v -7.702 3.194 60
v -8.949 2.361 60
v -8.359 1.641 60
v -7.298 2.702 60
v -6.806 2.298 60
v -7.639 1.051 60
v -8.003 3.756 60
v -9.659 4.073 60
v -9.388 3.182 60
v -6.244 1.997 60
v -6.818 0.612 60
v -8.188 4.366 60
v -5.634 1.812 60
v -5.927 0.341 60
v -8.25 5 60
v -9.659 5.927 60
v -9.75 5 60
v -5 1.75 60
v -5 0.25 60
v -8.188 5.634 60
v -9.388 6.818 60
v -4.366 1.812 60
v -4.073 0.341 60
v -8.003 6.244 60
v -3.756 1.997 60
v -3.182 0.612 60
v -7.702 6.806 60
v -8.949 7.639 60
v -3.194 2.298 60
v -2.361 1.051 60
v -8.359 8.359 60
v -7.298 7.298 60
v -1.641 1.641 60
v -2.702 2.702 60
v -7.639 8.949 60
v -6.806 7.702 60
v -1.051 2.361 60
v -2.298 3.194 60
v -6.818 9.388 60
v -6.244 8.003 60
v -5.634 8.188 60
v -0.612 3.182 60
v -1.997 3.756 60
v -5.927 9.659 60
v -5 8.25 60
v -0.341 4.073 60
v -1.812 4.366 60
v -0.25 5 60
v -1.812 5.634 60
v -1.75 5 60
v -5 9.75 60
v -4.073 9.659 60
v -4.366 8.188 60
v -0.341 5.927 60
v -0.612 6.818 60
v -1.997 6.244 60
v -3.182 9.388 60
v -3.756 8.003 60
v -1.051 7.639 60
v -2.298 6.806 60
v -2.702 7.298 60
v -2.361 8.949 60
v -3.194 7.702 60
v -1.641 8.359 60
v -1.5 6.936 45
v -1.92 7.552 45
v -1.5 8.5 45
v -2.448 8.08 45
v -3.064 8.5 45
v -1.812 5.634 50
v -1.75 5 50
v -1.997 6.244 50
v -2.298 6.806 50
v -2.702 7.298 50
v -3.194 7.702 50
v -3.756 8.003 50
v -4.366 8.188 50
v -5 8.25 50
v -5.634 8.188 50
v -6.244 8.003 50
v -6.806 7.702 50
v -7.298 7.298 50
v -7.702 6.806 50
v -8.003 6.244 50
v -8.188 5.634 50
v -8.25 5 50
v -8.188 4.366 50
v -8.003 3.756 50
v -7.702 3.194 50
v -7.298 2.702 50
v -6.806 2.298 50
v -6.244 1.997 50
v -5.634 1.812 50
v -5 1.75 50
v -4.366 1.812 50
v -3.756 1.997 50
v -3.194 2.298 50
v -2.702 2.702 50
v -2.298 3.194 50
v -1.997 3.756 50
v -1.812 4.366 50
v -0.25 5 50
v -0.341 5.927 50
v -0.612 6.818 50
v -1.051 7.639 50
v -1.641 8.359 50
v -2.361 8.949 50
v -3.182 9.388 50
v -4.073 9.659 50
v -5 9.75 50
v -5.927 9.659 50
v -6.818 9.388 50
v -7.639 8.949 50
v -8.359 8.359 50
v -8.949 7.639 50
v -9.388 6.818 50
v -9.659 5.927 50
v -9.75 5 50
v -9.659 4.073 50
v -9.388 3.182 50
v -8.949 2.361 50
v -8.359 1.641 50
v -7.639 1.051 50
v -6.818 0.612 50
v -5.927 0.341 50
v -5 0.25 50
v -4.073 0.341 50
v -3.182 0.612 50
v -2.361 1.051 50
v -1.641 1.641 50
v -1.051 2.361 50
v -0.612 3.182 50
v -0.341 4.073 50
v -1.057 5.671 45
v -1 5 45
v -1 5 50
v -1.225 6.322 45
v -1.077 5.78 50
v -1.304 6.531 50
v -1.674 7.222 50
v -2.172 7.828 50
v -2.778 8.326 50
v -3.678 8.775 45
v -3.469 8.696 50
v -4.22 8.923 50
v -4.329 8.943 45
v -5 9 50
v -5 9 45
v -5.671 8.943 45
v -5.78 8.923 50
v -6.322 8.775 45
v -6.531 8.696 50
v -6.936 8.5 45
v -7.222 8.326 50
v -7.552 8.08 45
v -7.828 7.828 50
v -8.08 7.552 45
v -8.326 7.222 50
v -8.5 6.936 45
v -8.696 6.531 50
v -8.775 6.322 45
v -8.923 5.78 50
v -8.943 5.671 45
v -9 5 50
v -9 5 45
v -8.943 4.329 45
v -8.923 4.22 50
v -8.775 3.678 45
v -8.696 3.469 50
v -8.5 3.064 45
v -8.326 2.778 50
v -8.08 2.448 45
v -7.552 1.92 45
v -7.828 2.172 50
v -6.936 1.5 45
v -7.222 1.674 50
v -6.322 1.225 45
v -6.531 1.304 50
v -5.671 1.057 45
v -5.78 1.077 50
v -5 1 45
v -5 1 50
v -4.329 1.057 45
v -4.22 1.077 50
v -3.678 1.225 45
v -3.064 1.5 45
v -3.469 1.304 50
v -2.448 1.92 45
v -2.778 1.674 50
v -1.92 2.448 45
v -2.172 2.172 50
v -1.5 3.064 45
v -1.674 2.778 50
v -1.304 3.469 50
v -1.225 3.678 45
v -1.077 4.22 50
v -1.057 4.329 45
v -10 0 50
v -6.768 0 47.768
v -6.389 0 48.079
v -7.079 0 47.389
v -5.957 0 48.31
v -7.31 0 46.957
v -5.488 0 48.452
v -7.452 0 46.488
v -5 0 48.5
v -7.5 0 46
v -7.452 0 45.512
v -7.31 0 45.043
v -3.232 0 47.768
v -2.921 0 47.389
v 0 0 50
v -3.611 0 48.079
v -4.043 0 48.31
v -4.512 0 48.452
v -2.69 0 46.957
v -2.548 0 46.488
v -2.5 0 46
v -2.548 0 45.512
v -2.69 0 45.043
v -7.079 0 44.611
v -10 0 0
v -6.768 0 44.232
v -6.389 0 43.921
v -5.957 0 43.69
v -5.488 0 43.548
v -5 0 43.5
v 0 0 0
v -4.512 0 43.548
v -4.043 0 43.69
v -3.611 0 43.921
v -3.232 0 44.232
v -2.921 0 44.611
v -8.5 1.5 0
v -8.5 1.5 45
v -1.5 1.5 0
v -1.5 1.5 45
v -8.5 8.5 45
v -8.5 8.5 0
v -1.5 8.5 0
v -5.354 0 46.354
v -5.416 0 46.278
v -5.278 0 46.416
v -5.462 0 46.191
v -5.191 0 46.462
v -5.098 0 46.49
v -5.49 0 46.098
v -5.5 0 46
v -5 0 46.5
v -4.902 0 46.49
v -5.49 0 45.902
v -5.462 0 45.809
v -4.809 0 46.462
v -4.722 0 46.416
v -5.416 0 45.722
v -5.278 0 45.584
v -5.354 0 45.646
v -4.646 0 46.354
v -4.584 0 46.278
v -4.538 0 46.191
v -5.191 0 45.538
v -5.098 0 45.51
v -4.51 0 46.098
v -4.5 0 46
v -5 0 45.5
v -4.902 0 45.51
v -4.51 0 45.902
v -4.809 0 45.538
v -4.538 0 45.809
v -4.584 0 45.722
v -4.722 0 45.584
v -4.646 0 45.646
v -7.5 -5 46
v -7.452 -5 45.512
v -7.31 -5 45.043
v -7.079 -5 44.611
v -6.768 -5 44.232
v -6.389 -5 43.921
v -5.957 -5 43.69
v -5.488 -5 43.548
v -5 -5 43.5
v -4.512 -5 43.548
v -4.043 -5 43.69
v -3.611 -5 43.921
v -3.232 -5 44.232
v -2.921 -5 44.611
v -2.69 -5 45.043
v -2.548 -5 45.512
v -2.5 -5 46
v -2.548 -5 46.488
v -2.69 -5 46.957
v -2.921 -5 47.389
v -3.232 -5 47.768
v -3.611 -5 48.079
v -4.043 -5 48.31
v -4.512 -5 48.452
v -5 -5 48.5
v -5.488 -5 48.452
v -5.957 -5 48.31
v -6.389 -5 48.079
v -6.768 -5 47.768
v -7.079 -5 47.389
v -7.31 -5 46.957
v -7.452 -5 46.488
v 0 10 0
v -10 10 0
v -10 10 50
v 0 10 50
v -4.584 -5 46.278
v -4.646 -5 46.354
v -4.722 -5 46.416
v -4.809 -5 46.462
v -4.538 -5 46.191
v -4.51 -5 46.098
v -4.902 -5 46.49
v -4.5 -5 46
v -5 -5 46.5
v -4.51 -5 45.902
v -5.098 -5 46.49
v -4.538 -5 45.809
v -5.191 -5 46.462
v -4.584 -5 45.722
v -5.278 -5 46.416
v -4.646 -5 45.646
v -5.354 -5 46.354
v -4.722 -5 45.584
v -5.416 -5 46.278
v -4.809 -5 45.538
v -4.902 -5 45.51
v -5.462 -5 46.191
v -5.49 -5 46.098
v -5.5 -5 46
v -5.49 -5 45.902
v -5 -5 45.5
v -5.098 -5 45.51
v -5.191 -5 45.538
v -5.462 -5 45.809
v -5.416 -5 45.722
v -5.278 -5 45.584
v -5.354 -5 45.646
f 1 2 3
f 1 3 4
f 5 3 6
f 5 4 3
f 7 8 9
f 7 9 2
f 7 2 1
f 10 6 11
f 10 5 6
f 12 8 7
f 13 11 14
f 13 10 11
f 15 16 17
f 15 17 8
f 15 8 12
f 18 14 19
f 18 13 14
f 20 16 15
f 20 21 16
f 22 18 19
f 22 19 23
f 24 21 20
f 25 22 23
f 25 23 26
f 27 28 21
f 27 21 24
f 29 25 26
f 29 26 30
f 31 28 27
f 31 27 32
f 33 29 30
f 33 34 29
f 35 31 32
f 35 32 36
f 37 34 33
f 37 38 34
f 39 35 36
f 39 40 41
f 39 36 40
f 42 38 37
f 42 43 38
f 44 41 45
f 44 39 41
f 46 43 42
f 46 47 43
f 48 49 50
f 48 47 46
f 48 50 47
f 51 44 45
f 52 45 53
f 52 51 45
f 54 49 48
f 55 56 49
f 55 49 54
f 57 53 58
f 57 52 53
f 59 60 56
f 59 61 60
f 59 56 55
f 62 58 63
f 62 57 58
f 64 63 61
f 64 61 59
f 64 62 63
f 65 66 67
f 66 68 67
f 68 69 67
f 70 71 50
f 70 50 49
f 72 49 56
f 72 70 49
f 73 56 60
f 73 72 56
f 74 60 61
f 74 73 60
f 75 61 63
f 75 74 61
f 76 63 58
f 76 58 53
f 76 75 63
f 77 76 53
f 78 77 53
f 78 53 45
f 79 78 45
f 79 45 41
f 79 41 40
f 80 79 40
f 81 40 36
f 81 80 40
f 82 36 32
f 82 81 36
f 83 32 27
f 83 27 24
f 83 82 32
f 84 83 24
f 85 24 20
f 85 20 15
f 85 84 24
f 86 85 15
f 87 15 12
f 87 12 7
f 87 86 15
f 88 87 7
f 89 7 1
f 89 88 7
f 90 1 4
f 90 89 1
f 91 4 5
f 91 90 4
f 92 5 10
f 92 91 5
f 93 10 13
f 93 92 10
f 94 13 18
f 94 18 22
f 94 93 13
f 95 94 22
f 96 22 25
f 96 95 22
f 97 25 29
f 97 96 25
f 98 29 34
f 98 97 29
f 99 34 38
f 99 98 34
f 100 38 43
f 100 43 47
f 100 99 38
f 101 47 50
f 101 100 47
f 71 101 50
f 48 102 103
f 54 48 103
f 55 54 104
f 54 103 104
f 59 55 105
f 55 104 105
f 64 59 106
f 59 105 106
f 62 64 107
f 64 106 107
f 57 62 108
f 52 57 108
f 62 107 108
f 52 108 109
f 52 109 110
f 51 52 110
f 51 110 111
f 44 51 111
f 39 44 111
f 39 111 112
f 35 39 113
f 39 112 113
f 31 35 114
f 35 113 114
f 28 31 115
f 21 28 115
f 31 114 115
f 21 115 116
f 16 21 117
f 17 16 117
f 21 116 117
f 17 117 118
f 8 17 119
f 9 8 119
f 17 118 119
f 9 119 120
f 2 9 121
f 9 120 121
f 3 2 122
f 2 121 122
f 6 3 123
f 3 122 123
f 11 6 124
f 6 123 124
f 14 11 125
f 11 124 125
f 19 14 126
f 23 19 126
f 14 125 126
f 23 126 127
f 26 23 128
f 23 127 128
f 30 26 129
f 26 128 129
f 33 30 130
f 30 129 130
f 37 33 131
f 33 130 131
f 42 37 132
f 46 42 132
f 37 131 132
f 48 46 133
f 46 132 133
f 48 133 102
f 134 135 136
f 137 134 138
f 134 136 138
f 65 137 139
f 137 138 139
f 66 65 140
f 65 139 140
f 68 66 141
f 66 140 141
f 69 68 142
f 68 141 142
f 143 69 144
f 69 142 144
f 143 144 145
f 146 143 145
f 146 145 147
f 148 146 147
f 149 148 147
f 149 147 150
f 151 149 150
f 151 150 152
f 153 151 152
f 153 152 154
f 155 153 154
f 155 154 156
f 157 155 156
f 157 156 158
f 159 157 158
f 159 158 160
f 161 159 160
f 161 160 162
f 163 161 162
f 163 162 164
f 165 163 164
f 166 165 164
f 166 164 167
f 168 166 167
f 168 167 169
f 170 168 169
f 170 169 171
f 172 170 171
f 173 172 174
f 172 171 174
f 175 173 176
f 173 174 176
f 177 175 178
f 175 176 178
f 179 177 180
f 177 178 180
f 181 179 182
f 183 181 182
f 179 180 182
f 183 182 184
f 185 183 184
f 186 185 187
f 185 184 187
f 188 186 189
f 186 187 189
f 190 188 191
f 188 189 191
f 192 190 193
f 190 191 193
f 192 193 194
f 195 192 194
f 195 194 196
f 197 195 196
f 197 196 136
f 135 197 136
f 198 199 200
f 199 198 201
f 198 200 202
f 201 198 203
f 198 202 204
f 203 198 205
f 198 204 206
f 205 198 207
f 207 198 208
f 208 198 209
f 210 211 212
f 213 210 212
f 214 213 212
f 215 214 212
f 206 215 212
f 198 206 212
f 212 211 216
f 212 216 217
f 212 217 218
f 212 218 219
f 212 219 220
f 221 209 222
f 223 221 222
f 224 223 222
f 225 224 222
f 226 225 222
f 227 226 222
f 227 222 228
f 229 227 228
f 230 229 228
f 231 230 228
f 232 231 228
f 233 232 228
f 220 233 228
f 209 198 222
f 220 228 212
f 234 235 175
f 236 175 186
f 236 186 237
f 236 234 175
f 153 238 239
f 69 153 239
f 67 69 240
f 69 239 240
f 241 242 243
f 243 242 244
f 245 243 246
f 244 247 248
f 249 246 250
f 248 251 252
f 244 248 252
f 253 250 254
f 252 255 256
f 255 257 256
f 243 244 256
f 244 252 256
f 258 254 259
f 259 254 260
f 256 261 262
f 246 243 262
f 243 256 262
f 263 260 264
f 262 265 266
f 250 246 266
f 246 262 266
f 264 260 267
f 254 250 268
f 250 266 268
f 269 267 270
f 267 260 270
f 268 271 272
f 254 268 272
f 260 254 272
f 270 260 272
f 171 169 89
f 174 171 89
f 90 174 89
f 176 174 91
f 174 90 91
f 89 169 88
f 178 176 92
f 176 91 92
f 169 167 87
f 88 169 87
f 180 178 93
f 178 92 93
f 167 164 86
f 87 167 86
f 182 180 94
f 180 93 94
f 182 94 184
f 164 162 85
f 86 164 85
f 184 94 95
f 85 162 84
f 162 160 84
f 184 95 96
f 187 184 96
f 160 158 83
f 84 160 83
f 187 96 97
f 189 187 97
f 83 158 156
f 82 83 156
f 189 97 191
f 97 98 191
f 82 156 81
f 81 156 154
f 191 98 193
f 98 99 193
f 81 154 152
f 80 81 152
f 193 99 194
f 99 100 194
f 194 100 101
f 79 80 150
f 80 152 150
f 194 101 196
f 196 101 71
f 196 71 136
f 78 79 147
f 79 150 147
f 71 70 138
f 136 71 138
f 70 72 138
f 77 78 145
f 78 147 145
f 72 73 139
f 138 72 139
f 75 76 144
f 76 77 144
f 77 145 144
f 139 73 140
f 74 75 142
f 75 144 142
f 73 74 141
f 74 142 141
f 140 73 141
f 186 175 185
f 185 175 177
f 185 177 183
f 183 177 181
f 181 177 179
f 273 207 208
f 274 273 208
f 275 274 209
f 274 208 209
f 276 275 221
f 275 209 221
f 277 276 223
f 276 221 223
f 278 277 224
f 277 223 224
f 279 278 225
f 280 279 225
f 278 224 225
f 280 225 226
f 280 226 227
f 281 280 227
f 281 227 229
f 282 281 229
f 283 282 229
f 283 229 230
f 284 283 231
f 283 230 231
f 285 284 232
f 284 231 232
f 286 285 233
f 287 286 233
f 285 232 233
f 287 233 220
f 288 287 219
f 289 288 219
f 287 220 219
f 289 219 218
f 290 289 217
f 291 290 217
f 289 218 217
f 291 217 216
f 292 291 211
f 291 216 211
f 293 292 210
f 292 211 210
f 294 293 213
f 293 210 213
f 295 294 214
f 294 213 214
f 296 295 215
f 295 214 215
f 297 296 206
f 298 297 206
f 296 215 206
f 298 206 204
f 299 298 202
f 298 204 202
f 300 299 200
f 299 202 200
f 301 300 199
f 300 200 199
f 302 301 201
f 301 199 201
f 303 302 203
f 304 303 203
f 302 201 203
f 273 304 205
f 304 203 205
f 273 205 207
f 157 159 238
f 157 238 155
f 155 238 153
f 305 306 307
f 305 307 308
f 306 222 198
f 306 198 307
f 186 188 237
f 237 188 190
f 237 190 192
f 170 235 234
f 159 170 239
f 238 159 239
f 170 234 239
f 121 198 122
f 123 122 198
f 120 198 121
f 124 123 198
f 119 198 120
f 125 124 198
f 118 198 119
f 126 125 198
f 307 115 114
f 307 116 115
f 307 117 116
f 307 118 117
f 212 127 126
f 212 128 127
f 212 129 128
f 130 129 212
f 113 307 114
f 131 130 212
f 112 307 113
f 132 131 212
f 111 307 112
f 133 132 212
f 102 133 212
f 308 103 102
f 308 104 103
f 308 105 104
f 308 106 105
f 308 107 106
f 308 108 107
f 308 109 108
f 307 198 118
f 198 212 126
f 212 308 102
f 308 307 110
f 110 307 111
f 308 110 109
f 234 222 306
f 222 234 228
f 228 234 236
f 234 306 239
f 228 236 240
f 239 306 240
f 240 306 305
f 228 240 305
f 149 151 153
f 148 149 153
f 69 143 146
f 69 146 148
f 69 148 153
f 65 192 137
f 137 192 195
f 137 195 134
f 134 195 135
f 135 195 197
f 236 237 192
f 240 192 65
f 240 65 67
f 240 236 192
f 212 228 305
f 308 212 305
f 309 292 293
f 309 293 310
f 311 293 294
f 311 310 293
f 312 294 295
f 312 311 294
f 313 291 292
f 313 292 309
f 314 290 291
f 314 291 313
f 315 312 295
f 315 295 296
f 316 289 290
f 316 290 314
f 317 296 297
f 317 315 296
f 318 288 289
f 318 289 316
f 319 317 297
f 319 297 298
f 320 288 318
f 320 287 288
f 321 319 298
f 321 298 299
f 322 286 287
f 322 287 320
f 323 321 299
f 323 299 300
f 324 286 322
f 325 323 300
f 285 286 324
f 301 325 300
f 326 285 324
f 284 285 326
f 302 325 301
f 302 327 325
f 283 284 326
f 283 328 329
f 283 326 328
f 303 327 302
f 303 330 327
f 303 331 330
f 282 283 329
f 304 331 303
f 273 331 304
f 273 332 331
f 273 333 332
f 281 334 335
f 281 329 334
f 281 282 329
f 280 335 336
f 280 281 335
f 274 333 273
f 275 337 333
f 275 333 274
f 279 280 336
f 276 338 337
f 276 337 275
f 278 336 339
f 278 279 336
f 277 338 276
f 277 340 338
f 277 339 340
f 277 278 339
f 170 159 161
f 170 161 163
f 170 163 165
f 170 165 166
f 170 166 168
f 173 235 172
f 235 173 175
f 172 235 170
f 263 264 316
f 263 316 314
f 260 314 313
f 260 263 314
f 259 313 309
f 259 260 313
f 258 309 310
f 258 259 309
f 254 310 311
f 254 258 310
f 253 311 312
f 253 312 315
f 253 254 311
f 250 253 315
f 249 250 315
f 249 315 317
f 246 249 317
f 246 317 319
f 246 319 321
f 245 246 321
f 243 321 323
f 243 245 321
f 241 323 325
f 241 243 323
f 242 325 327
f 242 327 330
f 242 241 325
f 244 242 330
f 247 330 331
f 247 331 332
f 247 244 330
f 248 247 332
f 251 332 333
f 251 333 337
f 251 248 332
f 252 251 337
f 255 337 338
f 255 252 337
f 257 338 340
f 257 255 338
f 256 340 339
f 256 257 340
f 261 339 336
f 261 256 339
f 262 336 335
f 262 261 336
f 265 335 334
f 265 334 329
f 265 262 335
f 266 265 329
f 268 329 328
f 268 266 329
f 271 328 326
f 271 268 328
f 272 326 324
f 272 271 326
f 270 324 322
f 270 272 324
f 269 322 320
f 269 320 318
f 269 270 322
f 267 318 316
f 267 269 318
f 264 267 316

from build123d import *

# Parameters (mm, degrees)
SKETCH1_W           = 10
SKETCH1_H           = 10
SKETCH1_W_2         = 7
SKETCH1_H_2         = 7
BOSS_EXTRUDE1_DEPTH = 50
SKETCH2_W           = 7
SKETCH2_H           = 7
BOSS_EXTRUDE2_DEPTH = 5
SKETCH3_R           = 4
CUT_EXTRUDE1_DEPTH  = 5
SKETCH4_R           = 2.5
SKETCH4_R_2         = 0.5
BOSS_EXTRUDE3_DEPTH = 5
SKETCH5_R           = 4.75
SKETCH5_R_2         = 3.25
BOSS_EXTRUDE4_DEPTH = 10


with BuildPart() as part:
    # Sketch1 → Boss-Extrude1 (new body)
    with BuildSketch(Plane.XY):
        with Locations((-5, 5)):
            Rectangle(SKETCH1_W, SKETCH1_H)
        with Locations((-5, 5)):
            Rectangle(SKETCH1_W_2, SKETCH1_H_2, mode=Mode.SUBTRACT)
    extrude(amount=BOSS_EXTRUDE1_DEPTH)

    # Sketch2 → Boss-Extrude2 (add)
    with BuildSketch(Plane.XY.offset(50)):
        with Locations((-5, 5)):
            Rectangle(SKETCH2_W, SKETCH2_H)
    extrude(amount=-BOSS_EXTRUDE2_DEPTH)

    # Sketch3 → Cut-Extrude1 (cut)
    with BuildSketch(Plane.XY.offset(50)):
        with Locations((-5, 5)):
            Circle(SKETCH3_R)
    extrude(amount=-CUT_EXTRUDE1_DEPTH, mode=Mode.SUBTRACT)

    # Sketch4 → Boss-Extrude3 (add)
    with BuildSketch(Plane.XZ):
        with Locations(Location((-5, 46, 0), (0, 0, 180))):
            Circle(SKETCH4_R)
        with Locations((-5, 46)):
            Circle(SKETCH4_R_2, mode=Mode.SUBTRACT)
    extrude(amount=BOSS_EXTRUDE3_DEPTH)

    # Sketch5 → Boss-Extrude4 (add)
    with BuildSketch(Plane.XY.offset(50)):
        with Locations((-5, 5)):
            Circle(SKETCH5_R)
        with Locations((-5, 5)):
            Circle(SKETCH5_R_2, mode=Mode.SUBTRACT)
    extrude(amount=BOSS_EXTRUDE4_DEPTH)


solid = part.part
